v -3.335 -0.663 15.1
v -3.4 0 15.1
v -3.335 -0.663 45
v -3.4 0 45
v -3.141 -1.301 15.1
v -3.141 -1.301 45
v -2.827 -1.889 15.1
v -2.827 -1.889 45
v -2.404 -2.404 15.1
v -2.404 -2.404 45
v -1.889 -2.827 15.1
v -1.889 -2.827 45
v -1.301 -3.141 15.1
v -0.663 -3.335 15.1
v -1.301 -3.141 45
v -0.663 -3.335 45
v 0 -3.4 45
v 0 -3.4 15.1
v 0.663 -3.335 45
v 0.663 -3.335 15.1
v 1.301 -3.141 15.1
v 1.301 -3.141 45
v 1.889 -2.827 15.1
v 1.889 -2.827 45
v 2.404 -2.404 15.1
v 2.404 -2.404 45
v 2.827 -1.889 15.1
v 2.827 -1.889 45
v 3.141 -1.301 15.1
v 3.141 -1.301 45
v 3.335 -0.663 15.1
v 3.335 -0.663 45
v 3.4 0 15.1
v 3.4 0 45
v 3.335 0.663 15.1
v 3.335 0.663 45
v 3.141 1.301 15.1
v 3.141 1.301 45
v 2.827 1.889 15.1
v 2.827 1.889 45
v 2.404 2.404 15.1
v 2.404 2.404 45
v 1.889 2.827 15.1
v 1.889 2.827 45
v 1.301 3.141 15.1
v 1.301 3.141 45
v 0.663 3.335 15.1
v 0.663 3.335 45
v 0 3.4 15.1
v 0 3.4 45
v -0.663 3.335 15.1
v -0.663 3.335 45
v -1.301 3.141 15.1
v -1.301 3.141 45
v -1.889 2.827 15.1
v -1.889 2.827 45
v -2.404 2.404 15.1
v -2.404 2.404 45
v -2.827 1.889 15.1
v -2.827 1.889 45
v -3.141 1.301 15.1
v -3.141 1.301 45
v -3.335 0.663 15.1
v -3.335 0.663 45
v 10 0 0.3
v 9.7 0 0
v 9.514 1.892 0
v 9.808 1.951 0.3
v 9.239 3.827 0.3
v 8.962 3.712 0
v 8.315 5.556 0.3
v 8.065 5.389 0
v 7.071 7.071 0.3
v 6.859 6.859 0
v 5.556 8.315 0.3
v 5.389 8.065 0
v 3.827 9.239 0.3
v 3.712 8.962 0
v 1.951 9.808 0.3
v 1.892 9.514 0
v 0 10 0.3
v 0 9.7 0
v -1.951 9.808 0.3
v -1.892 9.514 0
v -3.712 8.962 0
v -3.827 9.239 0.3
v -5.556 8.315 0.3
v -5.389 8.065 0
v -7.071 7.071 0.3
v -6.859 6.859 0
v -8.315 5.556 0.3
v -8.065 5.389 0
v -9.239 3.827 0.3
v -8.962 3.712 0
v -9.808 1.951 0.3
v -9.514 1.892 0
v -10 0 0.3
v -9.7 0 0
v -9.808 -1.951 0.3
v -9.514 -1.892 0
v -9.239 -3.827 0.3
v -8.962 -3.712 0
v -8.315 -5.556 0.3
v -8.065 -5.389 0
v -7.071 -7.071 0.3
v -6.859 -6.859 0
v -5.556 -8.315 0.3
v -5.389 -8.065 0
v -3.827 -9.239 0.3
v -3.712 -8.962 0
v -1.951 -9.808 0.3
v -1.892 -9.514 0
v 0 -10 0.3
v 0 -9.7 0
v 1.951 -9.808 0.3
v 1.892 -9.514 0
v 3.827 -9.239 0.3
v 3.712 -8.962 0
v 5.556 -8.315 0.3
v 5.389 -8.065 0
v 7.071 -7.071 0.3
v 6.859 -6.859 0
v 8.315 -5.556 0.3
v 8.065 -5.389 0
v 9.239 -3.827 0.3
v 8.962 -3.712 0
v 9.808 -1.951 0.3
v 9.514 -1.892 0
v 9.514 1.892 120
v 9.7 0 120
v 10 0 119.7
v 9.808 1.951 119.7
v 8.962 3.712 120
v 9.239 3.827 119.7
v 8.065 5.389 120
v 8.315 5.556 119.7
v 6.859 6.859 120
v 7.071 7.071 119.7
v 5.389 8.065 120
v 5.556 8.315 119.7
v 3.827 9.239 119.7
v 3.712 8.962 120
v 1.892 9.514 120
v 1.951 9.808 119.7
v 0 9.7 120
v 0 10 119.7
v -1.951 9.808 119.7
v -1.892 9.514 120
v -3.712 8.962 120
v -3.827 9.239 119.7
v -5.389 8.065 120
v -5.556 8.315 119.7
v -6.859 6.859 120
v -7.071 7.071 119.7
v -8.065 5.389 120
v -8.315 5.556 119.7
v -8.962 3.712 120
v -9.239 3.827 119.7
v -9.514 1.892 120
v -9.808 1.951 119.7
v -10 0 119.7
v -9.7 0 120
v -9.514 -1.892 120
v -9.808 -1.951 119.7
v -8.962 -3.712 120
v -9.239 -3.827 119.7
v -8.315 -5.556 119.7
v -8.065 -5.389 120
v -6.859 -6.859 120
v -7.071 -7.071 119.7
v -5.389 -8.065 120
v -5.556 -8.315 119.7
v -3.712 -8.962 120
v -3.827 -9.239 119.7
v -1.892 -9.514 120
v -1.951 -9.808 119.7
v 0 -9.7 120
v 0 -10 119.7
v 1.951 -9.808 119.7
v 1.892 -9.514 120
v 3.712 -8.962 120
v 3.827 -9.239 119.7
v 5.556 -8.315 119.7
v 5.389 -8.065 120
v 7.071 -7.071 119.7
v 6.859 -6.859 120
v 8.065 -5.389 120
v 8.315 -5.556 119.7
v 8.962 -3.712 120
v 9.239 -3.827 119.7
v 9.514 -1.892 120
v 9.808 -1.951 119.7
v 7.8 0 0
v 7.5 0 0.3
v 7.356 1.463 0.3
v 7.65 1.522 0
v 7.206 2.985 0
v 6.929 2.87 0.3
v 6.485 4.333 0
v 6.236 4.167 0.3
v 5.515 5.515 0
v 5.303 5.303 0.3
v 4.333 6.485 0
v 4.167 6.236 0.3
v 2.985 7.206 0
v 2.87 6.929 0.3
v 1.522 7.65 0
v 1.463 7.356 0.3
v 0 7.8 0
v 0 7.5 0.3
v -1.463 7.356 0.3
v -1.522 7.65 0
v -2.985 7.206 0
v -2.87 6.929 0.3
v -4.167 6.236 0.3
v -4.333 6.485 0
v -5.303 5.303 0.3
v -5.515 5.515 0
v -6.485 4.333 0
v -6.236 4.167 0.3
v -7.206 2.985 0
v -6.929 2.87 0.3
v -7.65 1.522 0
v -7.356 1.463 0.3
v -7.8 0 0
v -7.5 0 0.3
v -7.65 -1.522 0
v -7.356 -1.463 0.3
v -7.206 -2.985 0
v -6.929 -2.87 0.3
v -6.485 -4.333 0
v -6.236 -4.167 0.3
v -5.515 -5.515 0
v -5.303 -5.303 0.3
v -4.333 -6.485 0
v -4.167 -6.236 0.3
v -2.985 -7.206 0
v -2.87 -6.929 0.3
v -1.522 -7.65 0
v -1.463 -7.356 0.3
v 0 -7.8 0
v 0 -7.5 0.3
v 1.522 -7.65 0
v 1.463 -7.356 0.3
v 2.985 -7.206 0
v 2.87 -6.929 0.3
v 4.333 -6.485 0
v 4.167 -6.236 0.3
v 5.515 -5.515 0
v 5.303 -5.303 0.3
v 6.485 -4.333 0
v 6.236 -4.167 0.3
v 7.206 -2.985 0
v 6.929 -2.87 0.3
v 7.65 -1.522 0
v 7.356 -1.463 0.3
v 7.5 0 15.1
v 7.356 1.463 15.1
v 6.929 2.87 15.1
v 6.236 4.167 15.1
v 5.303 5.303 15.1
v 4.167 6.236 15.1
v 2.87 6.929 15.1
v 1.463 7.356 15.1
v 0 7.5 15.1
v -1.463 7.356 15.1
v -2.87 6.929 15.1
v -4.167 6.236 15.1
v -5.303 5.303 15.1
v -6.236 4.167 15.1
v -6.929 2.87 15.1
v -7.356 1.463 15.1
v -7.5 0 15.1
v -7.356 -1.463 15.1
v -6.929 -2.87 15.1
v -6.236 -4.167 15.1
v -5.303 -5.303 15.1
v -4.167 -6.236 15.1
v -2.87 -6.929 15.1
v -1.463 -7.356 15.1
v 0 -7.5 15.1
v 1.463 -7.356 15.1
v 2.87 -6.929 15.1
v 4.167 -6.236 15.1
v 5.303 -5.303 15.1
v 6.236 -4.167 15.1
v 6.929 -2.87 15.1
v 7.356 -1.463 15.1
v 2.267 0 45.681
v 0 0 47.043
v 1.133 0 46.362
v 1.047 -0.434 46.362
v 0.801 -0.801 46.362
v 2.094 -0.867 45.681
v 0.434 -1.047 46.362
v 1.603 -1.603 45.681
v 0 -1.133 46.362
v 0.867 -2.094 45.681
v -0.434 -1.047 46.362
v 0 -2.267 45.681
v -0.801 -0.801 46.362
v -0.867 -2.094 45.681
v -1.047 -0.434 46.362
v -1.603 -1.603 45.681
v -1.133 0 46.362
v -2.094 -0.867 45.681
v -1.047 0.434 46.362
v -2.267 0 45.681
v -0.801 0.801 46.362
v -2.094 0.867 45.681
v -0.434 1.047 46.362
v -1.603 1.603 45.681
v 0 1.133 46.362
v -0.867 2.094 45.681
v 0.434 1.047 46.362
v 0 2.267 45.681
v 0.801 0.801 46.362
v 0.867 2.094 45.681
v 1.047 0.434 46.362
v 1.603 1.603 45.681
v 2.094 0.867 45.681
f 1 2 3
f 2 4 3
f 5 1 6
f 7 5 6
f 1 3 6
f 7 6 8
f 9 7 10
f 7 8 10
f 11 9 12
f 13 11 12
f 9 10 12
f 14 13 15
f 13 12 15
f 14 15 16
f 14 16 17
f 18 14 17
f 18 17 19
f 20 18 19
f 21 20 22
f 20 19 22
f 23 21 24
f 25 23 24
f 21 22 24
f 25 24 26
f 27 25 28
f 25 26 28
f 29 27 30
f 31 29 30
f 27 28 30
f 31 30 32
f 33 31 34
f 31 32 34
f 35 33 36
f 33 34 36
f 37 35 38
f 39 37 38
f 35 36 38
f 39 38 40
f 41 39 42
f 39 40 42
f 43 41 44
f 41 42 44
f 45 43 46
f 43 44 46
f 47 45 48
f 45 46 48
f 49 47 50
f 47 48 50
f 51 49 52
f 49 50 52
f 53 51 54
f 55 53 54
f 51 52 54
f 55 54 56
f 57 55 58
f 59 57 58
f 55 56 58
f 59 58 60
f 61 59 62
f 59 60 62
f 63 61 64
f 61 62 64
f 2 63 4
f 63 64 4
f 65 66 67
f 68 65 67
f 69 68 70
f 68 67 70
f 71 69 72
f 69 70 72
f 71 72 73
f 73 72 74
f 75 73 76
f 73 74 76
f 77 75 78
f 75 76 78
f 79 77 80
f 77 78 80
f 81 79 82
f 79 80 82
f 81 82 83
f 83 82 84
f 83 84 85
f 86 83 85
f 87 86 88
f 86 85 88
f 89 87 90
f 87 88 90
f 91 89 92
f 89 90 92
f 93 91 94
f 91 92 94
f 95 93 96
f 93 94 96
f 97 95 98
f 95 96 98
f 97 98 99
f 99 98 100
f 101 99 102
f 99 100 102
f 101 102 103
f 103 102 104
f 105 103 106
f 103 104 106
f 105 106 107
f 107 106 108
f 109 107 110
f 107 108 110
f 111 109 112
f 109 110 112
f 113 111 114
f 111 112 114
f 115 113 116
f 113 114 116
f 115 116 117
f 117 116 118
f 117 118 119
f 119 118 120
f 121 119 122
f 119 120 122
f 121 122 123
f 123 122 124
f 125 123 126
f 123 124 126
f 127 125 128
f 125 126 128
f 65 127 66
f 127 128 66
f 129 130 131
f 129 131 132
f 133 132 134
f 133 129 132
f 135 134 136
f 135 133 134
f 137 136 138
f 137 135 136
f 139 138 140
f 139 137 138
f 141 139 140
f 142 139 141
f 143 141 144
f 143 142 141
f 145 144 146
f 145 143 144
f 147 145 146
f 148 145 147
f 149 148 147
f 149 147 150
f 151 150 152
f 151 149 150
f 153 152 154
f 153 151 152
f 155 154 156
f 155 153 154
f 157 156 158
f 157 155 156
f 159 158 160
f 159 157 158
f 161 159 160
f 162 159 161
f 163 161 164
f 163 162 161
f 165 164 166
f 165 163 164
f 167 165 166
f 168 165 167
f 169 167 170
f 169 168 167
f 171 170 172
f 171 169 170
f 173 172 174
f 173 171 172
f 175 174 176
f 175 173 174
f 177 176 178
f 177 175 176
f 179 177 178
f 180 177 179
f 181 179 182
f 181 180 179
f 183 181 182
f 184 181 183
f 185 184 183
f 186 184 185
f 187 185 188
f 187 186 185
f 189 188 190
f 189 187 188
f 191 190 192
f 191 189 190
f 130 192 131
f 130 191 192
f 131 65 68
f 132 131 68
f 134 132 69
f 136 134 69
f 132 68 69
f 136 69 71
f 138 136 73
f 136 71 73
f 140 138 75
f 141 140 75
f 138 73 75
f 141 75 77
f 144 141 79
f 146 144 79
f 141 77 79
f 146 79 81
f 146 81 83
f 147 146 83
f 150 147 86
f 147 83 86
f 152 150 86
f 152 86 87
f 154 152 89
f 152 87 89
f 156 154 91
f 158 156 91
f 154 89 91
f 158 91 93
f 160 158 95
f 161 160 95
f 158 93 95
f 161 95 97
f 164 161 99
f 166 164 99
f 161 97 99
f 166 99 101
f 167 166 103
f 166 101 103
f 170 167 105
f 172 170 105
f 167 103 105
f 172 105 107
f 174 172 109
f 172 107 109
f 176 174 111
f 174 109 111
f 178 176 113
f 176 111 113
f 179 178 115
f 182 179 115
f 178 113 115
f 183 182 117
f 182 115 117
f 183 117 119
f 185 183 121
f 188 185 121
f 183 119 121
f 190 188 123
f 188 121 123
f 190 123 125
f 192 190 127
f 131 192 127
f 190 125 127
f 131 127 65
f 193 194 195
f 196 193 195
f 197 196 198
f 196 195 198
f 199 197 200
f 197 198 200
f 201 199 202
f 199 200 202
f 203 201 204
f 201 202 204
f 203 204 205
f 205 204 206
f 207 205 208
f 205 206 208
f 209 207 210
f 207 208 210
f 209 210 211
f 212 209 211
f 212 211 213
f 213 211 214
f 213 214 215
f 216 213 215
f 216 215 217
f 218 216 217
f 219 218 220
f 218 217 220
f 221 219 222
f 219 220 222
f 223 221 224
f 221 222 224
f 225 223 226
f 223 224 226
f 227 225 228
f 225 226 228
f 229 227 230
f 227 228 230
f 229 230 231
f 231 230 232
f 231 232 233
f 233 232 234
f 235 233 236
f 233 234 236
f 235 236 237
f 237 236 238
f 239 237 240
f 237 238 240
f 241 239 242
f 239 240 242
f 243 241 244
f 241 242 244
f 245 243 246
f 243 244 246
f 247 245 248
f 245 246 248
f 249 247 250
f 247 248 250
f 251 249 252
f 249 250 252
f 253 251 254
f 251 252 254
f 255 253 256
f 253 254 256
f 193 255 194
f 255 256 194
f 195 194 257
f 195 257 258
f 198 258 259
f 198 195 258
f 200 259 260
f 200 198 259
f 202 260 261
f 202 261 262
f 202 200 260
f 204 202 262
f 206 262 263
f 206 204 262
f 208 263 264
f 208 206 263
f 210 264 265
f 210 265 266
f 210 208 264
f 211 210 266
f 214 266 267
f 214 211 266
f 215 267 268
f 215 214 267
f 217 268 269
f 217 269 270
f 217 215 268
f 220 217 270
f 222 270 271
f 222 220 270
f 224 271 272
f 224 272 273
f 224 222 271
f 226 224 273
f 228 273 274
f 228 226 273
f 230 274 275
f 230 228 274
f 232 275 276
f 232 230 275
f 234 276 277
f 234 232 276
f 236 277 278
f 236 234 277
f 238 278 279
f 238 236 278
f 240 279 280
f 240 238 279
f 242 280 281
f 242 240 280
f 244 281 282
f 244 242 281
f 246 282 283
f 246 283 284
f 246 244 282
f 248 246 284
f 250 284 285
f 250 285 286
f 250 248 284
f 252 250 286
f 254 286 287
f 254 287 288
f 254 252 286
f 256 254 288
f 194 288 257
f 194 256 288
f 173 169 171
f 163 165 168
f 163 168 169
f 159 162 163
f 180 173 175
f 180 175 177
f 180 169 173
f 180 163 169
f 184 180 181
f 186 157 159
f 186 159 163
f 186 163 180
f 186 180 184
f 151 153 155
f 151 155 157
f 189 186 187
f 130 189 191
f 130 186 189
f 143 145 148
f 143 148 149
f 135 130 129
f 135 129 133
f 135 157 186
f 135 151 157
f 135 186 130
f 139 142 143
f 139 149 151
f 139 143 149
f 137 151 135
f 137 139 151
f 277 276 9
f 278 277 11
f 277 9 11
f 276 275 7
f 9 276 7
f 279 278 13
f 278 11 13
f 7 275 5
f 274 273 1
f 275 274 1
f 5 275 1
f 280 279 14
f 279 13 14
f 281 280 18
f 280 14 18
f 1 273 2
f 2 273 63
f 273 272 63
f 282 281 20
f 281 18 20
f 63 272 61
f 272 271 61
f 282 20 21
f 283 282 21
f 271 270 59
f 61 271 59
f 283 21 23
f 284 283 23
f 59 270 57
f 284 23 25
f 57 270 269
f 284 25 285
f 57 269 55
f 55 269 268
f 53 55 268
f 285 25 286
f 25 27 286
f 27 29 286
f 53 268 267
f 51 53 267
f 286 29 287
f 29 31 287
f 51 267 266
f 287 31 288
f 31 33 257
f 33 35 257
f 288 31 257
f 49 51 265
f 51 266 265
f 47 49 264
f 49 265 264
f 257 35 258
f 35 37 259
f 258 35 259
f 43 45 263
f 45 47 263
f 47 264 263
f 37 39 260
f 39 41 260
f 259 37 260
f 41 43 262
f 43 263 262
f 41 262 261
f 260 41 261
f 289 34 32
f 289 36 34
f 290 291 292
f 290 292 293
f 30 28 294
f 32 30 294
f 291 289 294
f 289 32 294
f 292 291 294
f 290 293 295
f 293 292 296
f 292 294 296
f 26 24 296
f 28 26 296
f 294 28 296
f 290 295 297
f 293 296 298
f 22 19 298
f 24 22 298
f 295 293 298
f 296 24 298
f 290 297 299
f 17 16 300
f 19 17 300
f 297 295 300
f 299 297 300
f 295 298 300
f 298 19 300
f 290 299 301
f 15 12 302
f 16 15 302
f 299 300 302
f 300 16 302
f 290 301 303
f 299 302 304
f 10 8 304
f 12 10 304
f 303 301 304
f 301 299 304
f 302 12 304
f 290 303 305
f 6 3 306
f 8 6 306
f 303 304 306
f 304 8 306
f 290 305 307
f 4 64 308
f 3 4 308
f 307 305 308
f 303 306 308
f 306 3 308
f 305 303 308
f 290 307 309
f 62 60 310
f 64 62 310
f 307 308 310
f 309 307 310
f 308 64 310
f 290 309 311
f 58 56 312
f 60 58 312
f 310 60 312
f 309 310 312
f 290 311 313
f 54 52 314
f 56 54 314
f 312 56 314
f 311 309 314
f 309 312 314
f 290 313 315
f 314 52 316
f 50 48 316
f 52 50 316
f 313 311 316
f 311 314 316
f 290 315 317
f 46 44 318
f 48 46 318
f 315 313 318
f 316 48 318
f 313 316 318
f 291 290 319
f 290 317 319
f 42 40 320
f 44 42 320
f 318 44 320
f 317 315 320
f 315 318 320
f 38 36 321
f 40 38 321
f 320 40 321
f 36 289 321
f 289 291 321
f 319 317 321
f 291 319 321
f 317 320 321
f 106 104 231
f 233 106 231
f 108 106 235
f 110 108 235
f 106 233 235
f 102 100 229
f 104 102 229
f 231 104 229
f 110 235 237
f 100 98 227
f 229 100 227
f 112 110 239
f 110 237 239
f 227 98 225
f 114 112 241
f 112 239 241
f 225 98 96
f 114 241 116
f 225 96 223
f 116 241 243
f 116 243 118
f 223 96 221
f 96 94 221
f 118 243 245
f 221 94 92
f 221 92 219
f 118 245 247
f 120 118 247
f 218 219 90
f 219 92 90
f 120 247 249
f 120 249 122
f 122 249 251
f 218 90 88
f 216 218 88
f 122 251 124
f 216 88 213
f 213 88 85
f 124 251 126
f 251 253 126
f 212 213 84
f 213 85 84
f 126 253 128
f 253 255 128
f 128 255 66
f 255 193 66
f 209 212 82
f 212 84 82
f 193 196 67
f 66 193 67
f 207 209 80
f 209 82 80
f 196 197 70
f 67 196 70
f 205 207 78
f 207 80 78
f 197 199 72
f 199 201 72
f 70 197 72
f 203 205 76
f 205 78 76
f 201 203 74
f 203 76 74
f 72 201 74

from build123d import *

# Parameters (mm, degrees)
F0_R     = 10
F0_R_2   = 7.5
F1_DEPTH = 120
F2_DEPTH = 15.1
F3_D     = 6.8
F3_DEPTH = 45
F3_TIP   = 2.0429261047
F4_SIZE  = 0.3


with BuildPart() as f1:
    # F0 (on Top) → F1 (new body)
    with BuildSketch(Plane.XY):
        Circle(F0_R)
        Circle(F0_R_2, mode=Mode.SUBTRACT)
        Circle(F0_R_2)
    extrude(amount=F1_DEPTH)

    # F0 (on Top) → F2 (cut)
    with BuildSketch(Plane.XY):
        Circle(F0_R_2)
    extrude(amount=F2_DEPTH, mode=Mode.SUBTRACT)

    # F3
    with Locations(Plane(origin=(0, 0, 0), x_dir=(1, 0, 0), z_dir=(0, 0, -1))):
        with Locations((0, 0)):
            Hole(F3_D / 2, depth=F3_DEPTH)
            with Locations((0, 0, -(F3_DEPTH + F3_TIP / 2))):  # 118° drill point
                Cone(0, F3_D / 2, F3_TIP, mode=Mode.SUBTRACT)

    # F4
    f4_edges = [f1.edges().sort_by_distance(p)[0] for p in [
        (-10, 0, 120),
        (-7.5, 0, 0),
        (-10, 0, 0),
    ]]
    chamfer(f4_edges, length=F4_SIZE)


solid = f1.part
